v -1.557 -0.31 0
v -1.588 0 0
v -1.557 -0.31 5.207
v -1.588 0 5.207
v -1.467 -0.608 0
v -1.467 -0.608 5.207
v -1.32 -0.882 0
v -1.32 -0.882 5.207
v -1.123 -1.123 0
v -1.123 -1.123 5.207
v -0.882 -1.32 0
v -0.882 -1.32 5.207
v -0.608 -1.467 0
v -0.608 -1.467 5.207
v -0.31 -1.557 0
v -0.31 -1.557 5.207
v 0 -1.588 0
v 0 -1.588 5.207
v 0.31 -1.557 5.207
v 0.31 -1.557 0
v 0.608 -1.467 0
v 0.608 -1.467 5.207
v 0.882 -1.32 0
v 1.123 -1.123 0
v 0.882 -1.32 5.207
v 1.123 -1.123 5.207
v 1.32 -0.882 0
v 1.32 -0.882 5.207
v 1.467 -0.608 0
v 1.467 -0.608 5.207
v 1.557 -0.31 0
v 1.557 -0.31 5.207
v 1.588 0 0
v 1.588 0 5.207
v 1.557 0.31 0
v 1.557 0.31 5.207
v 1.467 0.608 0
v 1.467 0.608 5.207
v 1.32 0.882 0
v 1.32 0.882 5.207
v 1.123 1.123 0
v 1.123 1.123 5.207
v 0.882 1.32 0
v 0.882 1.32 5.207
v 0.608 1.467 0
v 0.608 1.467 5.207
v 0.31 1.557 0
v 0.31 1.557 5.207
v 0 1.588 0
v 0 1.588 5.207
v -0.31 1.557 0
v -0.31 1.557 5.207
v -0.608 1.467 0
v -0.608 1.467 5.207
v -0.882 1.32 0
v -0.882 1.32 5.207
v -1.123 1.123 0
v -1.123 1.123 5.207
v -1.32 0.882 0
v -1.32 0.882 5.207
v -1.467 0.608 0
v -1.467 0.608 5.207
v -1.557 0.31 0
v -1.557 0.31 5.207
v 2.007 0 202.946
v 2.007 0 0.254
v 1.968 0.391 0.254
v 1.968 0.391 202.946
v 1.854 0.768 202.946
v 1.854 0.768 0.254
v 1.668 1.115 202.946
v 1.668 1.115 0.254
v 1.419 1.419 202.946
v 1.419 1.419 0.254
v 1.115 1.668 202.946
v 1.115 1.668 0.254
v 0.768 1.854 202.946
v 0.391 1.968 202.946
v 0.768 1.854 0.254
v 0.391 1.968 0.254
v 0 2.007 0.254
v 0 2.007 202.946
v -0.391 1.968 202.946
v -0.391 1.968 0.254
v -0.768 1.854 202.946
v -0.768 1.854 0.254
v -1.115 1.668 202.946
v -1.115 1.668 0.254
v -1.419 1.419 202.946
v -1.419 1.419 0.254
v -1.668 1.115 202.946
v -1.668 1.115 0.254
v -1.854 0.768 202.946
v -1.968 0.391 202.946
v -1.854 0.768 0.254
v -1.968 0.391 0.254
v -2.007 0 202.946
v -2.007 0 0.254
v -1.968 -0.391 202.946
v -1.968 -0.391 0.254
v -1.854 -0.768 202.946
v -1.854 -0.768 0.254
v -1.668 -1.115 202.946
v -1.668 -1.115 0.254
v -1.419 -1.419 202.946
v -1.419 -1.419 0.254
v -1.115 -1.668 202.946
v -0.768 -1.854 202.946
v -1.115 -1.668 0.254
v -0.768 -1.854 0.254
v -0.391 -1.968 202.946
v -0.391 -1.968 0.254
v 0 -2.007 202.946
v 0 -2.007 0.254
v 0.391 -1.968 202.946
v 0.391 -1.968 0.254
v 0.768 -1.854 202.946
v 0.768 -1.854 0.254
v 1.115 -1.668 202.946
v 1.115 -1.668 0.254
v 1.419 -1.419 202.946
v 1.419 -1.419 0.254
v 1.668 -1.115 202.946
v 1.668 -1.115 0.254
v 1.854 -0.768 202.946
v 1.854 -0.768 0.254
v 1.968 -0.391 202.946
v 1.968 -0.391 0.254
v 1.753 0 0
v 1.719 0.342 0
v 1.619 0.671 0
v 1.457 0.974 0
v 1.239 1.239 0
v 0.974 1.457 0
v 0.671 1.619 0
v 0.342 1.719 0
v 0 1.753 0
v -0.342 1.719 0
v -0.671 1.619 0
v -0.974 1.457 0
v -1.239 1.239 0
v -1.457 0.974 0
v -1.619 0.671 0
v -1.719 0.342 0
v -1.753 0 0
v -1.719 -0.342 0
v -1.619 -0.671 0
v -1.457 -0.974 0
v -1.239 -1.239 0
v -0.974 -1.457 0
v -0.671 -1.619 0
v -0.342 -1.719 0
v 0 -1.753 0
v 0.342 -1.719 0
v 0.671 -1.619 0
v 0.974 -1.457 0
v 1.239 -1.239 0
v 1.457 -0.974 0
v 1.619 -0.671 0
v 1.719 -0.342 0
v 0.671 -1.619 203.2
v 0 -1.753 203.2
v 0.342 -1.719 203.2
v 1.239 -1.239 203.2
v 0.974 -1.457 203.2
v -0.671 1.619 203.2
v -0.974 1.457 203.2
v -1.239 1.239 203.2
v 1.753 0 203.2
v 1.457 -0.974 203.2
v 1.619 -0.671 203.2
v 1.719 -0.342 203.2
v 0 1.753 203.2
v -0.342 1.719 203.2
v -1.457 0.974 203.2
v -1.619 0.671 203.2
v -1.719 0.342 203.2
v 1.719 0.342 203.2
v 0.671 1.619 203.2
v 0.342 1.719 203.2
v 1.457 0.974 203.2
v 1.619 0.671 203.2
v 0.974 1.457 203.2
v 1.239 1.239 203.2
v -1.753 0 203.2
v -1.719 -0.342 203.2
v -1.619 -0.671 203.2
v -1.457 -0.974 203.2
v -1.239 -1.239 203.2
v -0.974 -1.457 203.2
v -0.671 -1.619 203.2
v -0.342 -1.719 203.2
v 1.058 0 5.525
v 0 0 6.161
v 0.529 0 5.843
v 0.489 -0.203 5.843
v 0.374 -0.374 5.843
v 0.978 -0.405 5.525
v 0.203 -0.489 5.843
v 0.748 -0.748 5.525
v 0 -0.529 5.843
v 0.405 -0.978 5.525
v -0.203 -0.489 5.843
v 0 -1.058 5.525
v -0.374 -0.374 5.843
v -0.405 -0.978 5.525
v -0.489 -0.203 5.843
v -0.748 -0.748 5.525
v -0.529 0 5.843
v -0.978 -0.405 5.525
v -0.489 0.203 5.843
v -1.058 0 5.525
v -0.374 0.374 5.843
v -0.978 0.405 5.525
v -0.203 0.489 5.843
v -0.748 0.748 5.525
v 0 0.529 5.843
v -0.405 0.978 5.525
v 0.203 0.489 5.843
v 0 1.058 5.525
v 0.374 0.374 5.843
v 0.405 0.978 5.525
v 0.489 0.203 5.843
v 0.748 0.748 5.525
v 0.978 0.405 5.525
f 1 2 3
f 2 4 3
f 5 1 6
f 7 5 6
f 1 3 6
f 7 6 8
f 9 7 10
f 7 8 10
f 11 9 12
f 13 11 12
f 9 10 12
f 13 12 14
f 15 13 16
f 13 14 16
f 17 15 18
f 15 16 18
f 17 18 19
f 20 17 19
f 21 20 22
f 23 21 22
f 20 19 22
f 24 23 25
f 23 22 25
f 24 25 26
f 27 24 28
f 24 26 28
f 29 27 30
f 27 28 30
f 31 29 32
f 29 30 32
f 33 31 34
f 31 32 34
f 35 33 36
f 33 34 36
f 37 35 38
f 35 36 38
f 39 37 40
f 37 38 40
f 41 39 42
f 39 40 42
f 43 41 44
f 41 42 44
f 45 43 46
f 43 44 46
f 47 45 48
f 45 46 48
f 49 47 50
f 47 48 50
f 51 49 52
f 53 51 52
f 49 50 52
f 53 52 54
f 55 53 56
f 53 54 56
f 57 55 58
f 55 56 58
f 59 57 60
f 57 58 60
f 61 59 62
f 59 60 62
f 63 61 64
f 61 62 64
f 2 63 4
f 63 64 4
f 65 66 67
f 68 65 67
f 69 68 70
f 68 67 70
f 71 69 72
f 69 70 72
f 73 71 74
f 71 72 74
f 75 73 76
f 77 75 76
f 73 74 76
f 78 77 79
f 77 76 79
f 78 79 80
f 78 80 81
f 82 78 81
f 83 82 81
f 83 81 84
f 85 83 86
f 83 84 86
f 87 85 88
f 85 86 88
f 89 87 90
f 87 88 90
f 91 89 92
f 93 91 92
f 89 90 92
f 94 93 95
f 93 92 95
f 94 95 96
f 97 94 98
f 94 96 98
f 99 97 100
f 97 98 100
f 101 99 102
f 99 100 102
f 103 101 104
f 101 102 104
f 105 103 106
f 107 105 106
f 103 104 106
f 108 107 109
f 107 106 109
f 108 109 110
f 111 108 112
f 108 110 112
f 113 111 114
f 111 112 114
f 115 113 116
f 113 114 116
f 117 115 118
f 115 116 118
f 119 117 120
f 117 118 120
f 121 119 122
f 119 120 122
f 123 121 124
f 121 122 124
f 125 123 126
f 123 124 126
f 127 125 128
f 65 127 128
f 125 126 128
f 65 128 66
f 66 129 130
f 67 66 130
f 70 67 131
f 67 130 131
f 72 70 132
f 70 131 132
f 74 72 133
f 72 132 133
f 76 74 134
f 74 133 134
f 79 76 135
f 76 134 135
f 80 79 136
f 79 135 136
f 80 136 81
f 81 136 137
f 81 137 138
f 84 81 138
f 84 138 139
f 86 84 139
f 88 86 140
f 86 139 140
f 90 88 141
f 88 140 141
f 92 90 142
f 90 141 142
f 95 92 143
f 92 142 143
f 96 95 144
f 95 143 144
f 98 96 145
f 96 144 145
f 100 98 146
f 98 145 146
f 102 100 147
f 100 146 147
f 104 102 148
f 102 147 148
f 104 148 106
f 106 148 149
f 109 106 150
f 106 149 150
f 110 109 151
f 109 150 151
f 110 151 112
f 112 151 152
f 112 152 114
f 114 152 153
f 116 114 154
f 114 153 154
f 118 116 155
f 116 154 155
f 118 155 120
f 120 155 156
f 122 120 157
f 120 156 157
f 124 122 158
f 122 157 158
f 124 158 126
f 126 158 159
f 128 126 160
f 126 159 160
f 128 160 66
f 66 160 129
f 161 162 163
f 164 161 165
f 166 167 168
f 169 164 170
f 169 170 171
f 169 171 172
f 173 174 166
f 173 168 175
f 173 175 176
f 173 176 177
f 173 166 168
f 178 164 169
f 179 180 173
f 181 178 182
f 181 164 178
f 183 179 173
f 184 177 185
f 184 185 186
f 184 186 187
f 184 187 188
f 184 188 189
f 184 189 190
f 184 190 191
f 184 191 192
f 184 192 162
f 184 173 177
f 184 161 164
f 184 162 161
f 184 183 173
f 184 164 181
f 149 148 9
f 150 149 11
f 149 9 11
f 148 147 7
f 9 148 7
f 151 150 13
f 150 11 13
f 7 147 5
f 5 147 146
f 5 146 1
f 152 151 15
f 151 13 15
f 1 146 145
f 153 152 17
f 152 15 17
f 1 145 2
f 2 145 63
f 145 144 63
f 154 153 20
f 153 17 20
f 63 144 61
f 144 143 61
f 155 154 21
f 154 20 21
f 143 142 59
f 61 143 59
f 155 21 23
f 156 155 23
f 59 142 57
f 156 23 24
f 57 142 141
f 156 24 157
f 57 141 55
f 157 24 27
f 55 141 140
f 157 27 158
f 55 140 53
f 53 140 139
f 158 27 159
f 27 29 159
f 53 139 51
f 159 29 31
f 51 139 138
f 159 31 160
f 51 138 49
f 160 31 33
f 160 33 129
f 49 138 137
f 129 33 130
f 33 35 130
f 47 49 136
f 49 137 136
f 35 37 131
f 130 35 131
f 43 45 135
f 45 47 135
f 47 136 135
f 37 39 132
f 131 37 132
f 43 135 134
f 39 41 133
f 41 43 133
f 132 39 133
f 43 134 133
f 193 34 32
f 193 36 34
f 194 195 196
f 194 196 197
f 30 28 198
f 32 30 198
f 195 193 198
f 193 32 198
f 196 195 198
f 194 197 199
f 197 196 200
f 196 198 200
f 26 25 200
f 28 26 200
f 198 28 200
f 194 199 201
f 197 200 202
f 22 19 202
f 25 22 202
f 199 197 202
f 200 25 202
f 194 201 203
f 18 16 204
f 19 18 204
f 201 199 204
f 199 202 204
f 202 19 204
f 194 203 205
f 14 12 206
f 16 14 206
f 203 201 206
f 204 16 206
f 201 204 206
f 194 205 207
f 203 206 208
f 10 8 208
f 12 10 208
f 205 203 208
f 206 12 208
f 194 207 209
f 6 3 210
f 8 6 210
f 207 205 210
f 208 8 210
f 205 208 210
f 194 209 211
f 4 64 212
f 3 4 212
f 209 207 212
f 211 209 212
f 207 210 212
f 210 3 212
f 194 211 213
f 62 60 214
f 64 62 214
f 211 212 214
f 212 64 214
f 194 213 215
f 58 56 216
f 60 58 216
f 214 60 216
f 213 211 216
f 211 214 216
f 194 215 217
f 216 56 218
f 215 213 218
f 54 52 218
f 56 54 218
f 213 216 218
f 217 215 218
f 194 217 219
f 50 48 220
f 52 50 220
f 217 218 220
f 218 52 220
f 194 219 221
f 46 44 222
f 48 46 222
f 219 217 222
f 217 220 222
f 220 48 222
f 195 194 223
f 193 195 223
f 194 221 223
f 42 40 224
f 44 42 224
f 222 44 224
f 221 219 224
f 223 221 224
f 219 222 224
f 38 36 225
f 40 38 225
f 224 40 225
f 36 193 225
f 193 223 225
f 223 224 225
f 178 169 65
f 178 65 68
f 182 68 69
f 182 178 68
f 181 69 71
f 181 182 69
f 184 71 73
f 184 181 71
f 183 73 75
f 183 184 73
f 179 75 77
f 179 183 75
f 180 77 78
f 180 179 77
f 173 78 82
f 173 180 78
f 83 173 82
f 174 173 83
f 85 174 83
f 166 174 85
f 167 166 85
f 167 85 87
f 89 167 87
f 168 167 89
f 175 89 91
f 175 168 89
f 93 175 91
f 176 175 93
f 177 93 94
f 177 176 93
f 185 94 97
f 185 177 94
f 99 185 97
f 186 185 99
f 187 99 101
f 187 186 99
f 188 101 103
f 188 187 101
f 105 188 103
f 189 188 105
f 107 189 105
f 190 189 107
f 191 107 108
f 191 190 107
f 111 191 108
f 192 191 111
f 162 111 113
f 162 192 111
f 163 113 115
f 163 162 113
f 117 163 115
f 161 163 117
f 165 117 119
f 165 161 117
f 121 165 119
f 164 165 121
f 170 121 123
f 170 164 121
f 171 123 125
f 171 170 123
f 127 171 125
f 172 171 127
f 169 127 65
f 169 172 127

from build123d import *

# Parameters (mm, degrees)
F0_R     = 2.0066
F1_DEPTH = 203.2
F2_SIZE  = 0.254
F3_D     = 3.175
F3_DEPTH = 5.207
F3_TIP   = 0.9538662327


with BuildPart() as f1:
    # F0 (on Top) → F1 (new body)
    with BuildSketch(Plane.XY):
        Circle(F0_R)
    extrude(amount=F1_DEPTH)

    # F2
    f2_edges = [f1.edges().sort_by_distance(p)[0] for p in [
        (-2.0066, 0, 0),
        (-2.0066, 0, 203.2),
    ]]
    chamfer(f2_edges, length=F2_SIZE)

    # F3
    with Locations(Plane(origin=(0, 0, 0), x_dir=(1, 0, 0), z_dir=(0, 0, -1))):
        with Locations((0, 0)):
            Hole(F3_D / 2, depth=F3_DEPTH)
            with Locations((0, 0, -(F3_DEPTH + F3_TIP / 2))):  # 118° drill point
                Cone(0, F3_D / 2, F3_TIP, mode=Mode.SUBTRACT)


solid = f1.part
